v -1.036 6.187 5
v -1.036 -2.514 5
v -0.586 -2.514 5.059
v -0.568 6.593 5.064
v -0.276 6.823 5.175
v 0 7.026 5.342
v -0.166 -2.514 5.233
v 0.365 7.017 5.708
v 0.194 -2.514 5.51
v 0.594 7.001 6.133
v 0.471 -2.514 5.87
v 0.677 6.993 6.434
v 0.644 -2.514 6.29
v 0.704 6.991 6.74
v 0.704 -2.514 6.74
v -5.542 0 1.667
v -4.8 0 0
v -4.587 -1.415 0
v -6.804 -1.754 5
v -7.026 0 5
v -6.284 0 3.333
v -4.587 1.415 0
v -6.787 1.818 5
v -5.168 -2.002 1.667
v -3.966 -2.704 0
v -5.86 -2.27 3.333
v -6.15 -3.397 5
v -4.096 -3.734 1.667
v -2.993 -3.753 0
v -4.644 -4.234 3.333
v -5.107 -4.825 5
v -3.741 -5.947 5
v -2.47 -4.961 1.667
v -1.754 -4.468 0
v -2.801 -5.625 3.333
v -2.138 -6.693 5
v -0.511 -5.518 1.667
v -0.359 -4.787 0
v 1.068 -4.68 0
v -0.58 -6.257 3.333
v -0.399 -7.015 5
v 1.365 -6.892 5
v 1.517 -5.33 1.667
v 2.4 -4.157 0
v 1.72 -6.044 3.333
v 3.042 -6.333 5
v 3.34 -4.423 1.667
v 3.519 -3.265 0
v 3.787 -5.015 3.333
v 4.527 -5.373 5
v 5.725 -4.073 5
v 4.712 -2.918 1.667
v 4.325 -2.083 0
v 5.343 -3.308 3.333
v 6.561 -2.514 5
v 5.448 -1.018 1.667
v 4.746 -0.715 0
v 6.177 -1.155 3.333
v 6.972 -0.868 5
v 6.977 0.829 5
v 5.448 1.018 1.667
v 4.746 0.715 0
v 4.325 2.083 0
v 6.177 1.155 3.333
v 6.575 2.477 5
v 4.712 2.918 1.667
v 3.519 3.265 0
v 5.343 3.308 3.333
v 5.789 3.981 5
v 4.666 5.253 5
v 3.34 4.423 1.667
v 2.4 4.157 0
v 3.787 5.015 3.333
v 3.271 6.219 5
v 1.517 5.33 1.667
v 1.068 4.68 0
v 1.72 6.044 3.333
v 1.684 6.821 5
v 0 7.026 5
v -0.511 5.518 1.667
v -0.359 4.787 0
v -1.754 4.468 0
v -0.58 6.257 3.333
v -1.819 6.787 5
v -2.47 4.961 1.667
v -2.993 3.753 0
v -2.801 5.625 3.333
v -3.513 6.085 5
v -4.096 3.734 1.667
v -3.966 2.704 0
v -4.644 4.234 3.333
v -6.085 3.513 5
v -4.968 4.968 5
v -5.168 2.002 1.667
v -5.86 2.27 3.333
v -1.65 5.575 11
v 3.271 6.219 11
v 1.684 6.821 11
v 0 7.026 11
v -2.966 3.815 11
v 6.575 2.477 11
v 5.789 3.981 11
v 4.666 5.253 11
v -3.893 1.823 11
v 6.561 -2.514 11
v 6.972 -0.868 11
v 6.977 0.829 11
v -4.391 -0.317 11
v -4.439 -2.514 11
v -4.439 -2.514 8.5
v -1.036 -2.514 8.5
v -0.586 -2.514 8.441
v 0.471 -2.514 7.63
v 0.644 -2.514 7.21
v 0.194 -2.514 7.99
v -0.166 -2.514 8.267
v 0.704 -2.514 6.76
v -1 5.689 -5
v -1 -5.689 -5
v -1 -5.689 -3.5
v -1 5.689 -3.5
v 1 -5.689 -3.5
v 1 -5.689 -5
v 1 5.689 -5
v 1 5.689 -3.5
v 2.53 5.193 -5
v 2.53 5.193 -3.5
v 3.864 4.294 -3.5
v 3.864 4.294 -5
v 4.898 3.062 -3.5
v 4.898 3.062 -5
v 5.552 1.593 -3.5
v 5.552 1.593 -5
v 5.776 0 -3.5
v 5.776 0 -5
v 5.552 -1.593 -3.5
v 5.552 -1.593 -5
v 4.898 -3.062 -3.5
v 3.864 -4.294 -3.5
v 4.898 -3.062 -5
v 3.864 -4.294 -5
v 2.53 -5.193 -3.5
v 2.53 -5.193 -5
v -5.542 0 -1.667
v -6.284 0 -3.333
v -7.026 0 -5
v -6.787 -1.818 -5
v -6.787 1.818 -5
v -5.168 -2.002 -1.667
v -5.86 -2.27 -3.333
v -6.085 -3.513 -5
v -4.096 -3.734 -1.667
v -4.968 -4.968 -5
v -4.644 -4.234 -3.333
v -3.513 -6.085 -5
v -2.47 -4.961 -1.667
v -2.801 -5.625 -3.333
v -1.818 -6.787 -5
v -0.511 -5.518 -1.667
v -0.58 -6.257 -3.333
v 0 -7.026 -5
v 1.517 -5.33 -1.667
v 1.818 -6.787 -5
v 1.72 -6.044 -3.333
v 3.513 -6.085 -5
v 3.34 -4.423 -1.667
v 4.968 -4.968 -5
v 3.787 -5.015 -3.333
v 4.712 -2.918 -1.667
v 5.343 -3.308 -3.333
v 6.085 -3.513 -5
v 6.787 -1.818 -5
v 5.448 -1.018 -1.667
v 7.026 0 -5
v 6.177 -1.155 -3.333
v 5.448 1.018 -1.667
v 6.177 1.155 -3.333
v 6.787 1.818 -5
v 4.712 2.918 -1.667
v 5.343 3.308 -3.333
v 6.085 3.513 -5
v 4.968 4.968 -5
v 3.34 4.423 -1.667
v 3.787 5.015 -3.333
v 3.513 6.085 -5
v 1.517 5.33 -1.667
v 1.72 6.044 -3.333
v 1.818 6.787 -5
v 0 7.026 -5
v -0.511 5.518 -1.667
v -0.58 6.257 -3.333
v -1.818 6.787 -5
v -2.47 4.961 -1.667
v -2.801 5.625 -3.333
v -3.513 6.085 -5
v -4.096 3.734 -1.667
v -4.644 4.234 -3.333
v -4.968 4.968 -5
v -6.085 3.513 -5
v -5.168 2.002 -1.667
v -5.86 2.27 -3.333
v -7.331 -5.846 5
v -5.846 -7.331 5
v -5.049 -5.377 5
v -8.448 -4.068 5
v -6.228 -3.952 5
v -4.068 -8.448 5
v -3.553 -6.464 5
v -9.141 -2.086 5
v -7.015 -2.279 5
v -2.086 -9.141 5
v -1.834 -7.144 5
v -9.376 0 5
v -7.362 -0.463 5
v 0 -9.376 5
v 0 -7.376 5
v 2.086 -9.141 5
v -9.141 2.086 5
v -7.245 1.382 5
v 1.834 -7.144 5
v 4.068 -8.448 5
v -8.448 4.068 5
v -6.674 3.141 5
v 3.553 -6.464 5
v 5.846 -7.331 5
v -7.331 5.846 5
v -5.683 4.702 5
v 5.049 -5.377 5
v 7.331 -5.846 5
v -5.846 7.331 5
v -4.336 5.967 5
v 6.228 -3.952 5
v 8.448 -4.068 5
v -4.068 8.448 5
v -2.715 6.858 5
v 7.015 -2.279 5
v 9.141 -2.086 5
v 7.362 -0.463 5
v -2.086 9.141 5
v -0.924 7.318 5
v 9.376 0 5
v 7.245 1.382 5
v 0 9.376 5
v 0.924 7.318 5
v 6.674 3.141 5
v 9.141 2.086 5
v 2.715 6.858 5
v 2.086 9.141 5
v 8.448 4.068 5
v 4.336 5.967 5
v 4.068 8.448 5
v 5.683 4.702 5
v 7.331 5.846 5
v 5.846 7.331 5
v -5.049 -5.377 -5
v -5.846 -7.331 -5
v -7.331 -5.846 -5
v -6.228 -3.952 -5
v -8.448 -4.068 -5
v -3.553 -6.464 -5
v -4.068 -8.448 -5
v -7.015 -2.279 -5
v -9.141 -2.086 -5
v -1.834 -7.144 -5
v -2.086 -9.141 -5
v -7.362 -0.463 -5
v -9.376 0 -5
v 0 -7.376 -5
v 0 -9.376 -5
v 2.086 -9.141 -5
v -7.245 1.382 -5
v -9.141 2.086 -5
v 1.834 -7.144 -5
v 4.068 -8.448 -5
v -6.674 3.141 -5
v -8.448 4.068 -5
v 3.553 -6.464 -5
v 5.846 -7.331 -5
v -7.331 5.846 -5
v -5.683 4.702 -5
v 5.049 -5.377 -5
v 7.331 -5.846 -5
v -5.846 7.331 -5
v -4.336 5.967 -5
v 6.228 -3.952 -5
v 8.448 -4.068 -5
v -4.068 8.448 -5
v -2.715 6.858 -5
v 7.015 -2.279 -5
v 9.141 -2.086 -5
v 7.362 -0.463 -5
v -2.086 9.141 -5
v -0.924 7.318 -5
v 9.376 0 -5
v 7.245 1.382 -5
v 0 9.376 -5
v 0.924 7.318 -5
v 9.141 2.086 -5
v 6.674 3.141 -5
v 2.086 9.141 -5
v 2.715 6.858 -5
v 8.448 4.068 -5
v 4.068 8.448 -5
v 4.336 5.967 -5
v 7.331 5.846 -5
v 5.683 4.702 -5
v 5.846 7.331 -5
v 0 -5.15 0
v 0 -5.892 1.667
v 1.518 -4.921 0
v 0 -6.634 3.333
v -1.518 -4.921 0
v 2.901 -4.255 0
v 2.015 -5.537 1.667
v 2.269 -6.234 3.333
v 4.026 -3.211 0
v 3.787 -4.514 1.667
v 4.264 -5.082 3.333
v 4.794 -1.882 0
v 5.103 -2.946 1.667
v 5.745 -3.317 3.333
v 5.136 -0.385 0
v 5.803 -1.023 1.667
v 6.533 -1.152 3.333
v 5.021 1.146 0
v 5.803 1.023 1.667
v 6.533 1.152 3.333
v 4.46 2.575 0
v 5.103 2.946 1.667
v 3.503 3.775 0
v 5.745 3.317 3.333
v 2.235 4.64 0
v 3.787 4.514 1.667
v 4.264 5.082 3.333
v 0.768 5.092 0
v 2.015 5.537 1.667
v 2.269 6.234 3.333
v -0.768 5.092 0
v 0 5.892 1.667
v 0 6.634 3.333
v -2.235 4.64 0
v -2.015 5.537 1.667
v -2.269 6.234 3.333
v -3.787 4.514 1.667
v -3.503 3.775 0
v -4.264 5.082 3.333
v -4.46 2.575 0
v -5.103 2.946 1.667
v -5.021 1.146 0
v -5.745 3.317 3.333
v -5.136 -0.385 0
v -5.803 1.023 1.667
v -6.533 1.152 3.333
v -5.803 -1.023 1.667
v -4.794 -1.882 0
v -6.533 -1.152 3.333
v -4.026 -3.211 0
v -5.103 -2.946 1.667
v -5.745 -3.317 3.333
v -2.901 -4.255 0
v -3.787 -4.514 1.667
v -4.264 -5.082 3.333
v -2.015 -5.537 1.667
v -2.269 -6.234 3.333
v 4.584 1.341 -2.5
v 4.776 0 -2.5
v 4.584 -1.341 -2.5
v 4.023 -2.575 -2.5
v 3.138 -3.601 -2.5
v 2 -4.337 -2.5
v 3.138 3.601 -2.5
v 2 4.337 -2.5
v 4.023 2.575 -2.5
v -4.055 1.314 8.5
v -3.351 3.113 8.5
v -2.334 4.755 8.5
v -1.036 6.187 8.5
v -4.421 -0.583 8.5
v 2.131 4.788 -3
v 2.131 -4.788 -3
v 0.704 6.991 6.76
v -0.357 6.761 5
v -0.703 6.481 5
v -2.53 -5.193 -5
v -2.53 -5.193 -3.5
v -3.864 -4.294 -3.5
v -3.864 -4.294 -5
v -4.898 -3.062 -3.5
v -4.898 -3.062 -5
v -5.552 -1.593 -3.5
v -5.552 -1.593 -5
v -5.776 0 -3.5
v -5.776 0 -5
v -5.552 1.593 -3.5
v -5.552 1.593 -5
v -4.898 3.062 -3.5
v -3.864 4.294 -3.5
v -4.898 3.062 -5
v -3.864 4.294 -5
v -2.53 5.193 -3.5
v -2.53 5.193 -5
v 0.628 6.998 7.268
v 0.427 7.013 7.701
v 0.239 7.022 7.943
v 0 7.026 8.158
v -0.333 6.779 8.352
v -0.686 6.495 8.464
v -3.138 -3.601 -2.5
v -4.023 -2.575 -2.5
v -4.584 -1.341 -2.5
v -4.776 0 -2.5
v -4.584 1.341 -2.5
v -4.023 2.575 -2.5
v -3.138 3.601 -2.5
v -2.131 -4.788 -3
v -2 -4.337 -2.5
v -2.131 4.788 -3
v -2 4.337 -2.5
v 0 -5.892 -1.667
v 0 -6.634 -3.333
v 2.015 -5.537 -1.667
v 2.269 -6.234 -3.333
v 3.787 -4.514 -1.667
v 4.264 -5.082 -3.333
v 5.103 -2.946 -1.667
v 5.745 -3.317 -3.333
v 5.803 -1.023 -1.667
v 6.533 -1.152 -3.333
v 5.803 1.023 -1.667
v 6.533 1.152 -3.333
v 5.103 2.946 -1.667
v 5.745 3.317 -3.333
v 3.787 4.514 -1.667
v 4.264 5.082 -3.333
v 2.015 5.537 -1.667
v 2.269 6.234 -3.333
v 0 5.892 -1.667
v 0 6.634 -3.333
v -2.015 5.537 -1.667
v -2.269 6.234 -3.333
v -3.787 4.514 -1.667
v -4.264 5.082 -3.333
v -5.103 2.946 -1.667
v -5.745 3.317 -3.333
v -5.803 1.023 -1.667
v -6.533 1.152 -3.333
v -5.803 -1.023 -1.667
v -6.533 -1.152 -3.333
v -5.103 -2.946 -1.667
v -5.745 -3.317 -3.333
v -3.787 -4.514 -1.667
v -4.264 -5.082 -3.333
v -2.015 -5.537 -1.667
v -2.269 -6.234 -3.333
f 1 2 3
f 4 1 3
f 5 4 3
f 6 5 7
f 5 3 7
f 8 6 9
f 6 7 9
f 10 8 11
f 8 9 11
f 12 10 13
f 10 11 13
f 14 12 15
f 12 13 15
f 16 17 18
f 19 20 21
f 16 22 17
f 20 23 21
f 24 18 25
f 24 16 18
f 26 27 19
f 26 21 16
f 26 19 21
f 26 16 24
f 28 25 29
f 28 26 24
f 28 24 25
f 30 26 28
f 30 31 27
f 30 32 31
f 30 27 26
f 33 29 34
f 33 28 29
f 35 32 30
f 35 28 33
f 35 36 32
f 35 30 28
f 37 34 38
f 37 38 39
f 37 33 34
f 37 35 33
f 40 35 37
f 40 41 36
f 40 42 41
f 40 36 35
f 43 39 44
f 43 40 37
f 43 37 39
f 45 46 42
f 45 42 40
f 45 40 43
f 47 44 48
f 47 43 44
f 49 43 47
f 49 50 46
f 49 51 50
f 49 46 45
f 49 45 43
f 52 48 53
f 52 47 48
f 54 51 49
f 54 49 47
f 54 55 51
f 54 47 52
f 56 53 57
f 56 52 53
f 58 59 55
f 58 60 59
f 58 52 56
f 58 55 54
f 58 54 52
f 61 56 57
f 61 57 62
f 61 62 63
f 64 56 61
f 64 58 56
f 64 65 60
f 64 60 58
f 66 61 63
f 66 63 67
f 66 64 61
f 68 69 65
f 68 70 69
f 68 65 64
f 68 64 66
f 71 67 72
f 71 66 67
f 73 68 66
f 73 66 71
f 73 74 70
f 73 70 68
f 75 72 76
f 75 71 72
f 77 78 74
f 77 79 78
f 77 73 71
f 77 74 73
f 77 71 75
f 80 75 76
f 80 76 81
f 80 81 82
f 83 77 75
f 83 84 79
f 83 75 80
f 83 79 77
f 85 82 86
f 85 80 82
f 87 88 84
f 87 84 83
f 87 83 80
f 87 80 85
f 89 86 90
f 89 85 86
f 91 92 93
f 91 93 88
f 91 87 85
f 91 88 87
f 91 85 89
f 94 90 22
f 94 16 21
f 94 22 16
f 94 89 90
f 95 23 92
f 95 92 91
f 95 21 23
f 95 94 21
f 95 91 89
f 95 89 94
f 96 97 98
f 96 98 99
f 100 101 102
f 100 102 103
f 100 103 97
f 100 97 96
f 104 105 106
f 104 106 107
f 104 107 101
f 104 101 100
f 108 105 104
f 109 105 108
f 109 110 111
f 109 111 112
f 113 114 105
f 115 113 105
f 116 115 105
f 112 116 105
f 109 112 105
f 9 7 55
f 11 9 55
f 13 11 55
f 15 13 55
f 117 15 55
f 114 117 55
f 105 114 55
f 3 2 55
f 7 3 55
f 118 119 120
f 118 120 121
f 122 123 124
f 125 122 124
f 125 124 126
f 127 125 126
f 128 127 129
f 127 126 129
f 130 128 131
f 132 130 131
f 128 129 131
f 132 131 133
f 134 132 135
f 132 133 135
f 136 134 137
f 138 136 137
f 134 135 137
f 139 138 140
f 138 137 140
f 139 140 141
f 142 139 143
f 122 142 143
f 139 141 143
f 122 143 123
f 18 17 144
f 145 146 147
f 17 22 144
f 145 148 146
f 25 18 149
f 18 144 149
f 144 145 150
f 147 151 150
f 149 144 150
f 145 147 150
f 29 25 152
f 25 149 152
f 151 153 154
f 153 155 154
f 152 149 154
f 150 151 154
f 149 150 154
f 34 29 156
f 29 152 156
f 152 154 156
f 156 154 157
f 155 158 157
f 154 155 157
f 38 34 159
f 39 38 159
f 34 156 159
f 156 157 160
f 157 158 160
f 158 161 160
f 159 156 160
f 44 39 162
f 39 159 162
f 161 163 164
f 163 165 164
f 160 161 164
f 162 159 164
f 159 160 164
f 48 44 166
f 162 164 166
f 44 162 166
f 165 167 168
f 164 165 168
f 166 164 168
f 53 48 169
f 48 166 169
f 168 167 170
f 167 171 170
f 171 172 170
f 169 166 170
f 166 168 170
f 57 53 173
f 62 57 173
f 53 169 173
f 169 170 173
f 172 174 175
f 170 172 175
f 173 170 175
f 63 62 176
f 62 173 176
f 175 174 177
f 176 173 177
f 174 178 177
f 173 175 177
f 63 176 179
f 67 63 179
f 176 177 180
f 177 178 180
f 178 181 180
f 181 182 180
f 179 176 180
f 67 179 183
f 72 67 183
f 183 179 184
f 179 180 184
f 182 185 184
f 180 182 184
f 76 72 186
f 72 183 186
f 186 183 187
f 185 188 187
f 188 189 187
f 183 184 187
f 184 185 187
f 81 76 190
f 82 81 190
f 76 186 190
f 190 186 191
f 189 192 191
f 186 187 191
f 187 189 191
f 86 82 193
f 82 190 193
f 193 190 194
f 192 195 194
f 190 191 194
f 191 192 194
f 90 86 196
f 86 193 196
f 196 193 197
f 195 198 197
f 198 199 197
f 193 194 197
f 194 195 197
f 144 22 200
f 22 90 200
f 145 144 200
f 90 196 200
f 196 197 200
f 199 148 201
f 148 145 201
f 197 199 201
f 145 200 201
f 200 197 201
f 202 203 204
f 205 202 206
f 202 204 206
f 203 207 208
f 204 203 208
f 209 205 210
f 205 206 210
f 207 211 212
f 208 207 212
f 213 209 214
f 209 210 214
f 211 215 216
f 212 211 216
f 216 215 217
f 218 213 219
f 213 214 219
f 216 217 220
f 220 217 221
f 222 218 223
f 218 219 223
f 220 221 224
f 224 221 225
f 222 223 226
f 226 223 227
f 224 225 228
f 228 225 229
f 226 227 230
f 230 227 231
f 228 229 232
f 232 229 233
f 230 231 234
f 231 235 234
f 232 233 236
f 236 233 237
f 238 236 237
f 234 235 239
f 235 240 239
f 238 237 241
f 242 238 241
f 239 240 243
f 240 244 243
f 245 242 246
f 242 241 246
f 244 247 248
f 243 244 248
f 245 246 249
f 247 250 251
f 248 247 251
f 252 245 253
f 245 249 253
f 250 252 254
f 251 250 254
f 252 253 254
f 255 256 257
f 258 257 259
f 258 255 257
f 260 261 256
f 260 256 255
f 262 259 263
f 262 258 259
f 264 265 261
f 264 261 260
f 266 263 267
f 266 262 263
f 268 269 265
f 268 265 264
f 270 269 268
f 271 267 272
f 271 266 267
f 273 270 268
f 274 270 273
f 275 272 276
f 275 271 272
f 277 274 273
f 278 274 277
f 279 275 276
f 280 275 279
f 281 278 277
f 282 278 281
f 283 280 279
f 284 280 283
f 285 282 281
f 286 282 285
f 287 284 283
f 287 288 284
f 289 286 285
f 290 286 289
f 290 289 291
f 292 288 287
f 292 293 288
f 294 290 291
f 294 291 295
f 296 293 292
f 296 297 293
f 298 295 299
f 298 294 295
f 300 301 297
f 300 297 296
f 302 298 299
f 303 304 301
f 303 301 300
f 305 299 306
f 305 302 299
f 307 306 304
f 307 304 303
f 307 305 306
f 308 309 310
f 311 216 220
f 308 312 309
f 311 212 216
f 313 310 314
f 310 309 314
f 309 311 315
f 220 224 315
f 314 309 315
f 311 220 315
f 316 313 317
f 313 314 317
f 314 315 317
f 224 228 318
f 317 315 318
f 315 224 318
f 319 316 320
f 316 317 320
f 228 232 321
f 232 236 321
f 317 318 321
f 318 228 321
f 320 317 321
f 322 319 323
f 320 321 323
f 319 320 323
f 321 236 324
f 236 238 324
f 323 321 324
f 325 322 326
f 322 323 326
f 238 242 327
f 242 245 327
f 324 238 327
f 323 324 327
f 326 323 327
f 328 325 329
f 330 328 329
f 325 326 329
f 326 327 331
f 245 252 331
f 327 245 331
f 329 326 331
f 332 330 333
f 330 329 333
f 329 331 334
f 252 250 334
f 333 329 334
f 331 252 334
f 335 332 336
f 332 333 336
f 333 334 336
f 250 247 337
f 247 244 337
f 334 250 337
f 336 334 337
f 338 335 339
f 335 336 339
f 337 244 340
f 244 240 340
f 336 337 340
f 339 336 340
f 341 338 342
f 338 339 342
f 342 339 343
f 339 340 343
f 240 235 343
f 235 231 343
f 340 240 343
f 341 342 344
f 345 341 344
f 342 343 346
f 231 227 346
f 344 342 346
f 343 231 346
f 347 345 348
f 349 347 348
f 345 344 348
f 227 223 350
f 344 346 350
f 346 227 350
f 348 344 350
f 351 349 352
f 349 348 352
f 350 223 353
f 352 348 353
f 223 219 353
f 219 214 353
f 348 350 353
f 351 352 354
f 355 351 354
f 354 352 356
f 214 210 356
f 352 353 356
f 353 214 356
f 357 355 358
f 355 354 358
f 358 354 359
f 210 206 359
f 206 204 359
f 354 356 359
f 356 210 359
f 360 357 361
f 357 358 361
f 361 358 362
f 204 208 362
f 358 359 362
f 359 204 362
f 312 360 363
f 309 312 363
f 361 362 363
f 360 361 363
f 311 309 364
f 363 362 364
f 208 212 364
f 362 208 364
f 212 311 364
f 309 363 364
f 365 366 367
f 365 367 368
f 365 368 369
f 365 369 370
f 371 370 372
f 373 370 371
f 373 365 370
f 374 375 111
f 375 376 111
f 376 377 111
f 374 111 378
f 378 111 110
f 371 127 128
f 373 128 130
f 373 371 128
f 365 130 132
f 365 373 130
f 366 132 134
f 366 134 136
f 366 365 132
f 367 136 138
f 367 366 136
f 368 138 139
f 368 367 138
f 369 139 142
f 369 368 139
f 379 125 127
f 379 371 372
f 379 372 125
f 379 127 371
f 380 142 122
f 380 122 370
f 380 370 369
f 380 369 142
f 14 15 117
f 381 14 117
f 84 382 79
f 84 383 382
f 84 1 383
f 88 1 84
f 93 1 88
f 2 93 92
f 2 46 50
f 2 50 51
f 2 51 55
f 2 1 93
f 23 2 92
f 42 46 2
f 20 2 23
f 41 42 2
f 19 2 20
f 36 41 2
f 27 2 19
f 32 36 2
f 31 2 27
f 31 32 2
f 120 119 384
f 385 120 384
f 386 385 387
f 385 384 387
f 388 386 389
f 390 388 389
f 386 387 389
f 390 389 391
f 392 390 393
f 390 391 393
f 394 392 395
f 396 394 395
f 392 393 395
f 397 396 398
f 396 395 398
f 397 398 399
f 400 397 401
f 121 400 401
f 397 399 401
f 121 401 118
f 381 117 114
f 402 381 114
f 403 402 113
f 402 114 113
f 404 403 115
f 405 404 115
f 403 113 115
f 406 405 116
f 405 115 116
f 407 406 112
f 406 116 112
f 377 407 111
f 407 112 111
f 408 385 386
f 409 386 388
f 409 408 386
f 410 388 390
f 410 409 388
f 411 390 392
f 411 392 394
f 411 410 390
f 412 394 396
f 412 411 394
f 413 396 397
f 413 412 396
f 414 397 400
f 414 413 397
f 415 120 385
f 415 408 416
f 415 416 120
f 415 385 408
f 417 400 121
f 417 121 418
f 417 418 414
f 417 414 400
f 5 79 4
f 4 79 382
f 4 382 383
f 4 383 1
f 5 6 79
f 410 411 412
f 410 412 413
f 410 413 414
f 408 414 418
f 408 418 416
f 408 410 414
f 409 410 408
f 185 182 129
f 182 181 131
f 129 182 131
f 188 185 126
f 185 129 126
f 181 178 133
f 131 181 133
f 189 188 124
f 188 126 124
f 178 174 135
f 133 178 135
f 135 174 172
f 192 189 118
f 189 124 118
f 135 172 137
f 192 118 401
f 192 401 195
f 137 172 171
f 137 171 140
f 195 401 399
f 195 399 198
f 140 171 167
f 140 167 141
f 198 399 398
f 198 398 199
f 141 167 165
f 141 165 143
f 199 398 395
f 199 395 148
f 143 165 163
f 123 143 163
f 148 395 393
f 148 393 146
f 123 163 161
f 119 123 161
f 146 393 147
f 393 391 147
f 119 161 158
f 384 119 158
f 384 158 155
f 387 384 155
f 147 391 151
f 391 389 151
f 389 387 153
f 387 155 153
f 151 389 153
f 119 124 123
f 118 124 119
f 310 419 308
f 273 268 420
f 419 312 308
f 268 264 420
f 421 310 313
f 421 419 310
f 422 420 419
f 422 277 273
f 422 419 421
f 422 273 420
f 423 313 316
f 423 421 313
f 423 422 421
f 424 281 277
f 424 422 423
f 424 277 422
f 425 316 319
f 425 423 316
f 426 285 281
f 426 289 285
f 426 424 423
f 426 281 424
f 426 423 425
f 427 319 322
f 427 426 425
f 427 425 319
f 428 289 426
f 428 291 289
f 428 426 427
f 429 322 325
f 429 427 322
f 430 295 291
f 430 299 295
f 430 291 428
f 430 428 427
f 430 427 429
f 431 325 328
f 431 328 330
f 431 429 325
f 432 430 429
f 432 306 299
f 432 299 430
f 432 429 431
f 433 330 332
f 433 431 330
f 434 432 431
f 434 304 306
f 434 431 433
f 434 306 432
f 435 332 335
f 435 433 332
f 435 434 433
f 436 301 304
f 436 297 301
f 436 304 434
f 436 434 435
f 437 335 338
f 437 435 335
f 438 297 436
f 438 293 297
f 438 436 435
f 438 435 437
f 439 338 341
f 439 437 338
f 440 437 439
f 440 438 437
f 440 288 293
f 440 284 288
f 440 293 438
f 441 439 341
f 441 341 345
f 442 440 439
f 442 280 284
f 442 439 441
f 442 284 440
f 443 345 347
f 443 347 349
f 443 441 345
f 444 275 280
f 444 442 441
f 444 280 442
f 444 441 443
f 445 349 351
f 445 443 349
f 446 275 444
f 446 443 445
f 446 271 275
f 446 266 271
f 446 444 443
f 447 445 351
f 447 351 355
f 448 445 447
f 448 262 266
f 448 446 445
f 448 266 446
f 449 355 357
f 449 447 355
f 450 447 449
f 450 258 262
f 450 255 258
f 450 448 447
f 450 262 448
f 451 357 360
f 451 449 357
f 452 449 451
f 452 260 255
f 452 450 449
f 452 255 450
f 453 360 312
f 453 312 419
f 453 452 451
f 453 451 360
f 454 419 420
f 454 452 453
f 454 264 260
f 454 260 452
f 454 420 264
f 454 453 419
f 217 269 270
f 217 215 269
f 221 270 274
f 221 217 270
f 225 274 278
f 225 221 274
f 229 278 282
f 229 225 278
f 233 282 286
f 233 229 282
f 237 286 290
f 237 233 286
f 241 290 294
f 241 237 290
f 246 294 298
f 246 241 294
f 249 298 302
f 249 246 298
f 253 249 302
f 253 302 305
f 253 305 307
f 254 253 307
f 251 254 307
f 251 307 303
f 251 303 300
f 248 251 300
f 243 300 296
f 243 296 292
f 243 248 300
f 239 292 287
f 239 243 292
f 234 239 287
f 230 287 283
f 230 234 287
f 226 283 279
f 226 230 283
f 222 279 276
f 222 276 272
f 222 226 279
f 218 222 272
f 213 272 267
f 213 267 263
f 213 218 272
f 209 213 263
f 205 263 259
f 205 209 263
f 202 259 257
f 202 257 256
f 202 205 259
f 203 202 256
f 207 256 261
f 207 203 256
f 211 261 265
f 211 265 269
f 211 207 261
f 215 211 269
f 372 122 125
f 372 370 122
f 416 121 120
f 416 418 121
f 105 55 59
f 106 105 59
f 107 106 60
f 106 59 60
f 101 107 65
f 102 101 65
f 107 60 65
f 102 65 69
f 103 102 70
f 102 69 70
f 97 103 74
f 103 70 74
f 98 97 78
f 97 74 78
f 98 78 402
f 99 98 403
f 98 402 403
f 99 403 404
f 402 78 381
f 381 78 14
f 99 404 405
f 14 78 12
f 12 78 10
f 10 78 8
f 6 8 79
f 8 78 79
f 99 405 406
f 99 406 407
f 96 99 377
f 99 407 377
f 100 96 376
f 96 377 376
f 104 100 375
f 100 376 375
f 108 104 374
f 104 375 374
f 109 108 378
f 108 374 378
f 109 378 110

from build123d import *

# Parameters (mm, degrees)
PAD_DEPTH       = 6
POCKET_DEPTH    = 12
POCKET001_DEPTH = 9.5
POCKET002_DEPTH = 1.5
POCKET003_DEPTH = 1
POCKET003_TAPER = 45


with BuildPart() as body:
    # Sketch → Revolution (revolve)
    with BuildSketch(Plane.XZ):
        Polygon((0, 0), (-4.8, 0), (-7.026141, 5), (0, 5), align=None)
    revolution = revolve(axis=Axis((0, 0, 0), (0, 0, 1)))

    # Mirrored: Revolution across Sketch H_Axis
    add(revolution.mirror(Plane(origin=(0, 0, 0), x_dir=(0, -1, 0), z_dir=(0, 0, 1))))

    # Sketch001 (on Face2 of Mirrored) → Pad (new body)
    with BuildSketch(Plane(origin=(0, 0, 5), x_dir=(-1, 0, 0), z_dir=(0, 0, 1))):
        with BuildLine():
            ThreePointArc((-6.56085, 2.514341), (-5.789323, -3.981257), (4e-05, -7.026141))
            ThreePointArc((4e-05, -7.026141), (3.48134, -2.84298), (4.43915, 2.514341))
            Line((4.43915, 2.514341), (-6.56085, 2.514341))
        make_face()
    extrude(amount=PAD_DEPTH)

    # Sketch002 (on Face7 of Pad) → Pocket (cut)
    with BuildSketch(Plane.XZ.offset(2.514341)):
        with BuildLine():
            Line((-4.796278, 8.5), (-4.796278, 5))
            Line((-4.796278, 5), (-1.036278, 5))
            ThreePointArc((-1.036278, 5), (0.194088, 5.509634), (0.703722, 6.74))
            Line((0.703722, 6.74), (0.703722, 6.76))
            ThreePointArc((0.703722, 6.76), (0.194088, 7.990366), (-1.036278, 8.5))
            Line((-1.036278, 8.5), (-4.796278, 8.5))
        make_face()
    extrude(amount=-POCKET_DEPTH, mode=Mode.SUBTRACT)

    # Sketch003 → Pocket001 (cut, symmetric)
    with BuildSketch(Plane.YZ):
        with BuildLine():
            Line((-2.514341, 5), (-2.514341, 8.5))
            Line((-2.514341, 8.5), (-6.914341, 8.5))
            ThreePointArc((-6.914341, 8.5), (-7.267894, 8.353553), (-7.414341, 8))
            Line((-7.414341, 8), (-7.414341, 5.5))
            ThreePointArc((-7.414341, 5.5), (-7.267894, 5.146447), (-6.914341, 5))
            Line((-6.914341, 5), (-2.514341, 5))
        make_face()
    extrude(amount=POCKET001_DEPTH, both=True, mode=Mode.SUBTRACT)

    # Sketch004 (on Face10 of Pocket001) → Pocket002 (cut)
    with BuildSketch(Plane(origin=(0, 0, -5), x_dir=(1, 0, 0), z_dir=(0, 0, -1))):
        with BuildLine():
            ThreePointArc((-1, 5.68892), (-5.776141, 0), (-1, -5.68892))
            Line((-1, 5.68892), (-1, -5.68892))
        make_face()
        with BuildLine():
            Line((1, 5.68892), (1, -5.68892))
            ThreePointArc((1, -5.68892), (5.776141, 0), (1, 5.68892))
        make_face()
    extrude(amount=-POCKET002_DEPTH, mode=Mode.SUBTRACT)

    # Sketch005 (on Face19 of Pocket002) → Pocket003 (cut)
    with BuildSketch(Plane(origin=(0, 0, -3.5), x_dir=(1, 0, 0), z_dir=(0, 0, -1))):
        with BuildLine():
            ThreePointArc((-1, 5.68892), (-5.776141, 0), (-1, -5.68892))
            Line((-1, 5.68892), (-1, -5.68892))
        make_face()
        with BuildLine():
            Line((1, 5.68892), (1, -5.68892))
            ThreePointArc((1, -5.68892), (5.776141, 0), (1, 5.68892))
        make_face()
    extrude(amount=-POCKET003_DEPTH, taper=POCKET003_TAPER, mode=Mode.SUBTRACT)


with BuildPart() as body001:
    # Sketch006 → Revolution001 (revolve)
    with BuildSketch(Plane.YZ):
        Polygon((-5.15, 0), (-7.376141, 5), (-9.376141, 5), (-9.376141, 0), align=None)
    revolution001 = revolve(axis=Axis((0, 0, 0), (0, 0, 1)))

    # Mirrored001: Revolution001 across XY
    add(revolution001.mirror(Plane.XY))


solid = Compound([body.part, body001.part])
